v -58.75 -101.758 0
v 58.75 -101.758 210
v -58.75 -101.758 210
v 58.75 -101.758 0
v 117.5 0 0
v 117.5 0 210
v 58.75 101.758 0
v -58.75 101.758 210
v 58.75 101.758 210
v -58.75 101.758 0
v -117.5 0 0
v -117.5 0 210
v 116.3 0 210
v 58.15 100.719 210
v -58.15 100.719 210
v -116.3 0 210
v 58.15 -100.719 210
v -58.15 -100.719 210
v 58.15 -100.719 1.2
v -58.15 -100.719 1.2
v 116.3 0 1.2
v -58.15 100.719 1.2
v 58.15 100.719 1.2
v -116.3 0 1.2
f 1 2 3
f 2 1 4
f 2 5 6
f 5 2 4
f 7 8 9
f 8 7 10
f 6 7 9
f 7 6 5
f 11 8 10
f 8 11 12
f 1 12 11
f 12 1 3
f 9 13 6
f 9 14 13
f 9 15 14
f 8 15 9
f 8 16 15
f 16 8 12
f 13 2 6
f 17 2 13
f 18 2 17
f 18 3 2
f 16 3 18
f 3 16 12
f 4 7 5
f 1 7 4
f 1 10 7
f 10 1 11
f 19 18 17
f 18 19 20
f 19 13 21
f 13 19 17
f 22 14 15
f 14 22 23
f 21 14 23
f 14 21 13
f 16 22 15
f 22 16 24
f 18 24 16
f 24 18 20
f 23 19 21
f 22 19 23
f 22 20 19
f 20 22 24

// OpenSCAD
bucket_diameter = 235;
bucket_height = 210;
wall_thickness = 1.2;

difference()
{
    cylinder(r=bucket_diameter/2, h=bucket_height, $fn=6);
    translate([0, 0, wall_thickness])
    cylinder(r=(bucket_diameter/2 - wall_thickness), h=bucket_height, $fn=6);
}
